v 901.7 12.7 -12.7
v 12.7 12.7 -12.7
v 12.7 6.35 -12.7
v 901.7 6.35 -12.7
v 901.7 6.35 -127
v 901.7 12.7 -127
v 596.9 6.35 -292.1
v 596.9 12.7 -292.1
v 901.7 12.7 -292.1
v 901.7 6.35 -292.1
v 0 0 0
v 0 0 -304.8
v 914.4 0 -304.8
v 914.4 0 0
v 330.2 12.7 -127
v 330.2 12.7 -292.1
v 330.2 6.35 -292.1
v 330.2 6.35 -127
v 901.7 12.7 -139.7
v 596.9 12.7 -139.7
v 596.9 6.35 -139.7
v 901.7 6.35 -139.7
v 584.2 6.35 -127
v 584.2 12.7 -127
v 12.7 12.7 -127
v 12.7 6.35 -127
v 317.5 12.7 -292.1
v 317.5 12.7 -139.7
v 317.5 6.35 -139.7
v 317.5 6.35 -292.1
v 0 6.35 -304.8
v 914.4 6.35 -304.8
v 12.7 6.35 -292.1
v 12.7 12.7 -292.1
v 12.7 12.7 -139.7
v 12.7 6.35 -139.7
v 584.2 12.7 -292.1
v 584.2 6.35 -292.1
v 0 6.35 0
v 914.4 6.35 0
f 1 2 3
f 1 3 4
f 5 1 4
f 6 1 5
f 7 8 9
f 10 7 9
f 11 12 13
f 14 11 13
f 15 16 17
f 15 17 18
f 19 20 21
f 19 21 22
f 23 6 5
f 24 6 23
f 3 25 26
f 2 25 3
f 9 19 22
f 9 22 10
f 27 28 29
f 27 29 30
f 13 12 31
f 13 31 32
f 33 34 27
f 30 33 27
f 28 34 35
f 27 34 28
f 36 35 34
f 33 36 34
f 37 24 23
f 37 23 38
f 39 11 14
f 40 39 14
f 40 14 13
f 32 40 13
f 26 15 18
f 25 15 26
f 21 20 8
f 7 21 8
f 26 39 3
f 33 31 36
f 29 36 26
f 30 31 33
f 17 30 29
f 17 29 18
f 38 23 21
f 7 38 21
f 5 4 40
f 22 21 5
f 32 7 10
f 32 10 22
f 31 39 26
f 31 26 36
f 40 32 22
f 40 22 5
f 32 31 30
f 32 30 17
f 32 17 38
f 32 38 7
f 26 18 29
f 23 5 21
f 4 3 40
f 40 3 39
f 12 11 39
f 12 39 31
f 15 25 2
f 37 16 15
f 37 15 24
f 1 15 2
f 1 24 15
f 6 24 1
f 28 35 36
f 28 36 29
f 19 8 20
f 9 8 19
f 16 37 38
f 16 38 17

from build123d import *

# Parameters (mm, degrees)
SKETCH1_W           = 914.4
SKETCH1_H           = 304.8
BOSS_EXTRUDE1_DEPTH = 12.7
SKETCH2_W           = 914.4
SKETCH2_H           = 304.8
SKETCH2_W_2         = 304.8
SKETCH2_H_2         = 152.4
CUT_EXTRUDE1_DEPTH  = 6.35


with BuildPart() as part:
    # Sketch1 → Boss-Extrude1 (new body)
    with BuildSketch(Plane(origin=(0, 0, 0), x_dir=(1, 0, 0), z_dir=(0, 1, 0))):
        with Locations((457.2, 152.4)):
            Rectangle(SKETCH1_W, SKETCH1_H)
    extrude(amount=BOSS_EXTRUDE1_DEPTH)

    # Sketch2 → Cut-Extrude1 (cut)
    with BuildSketch(Plane(origin=(0, 12.7, 0), x_dir=(1, 0, 0), z_dir=(0, 1, 0))):
        with Locations((457.2, 152.4)):
            Rectangle(SKETCH2_W, SKETCH2_H)
        Polygon((330.2, 127), (12.7, 127), (12.7, 12.7), (901.7, 12.7), (901.7, 127), (584.2, 127), (584.2, 292.1), (330.2, 292.1), align=None, mode=Mode.SUBTRACT)
        with Locations((165.1, 215.9)):
            Rectangle(SKETCH2_W_2, SKETCH2_H_2, mode=Mode.SUBTRACT)
        with Locations((749.3, 215.9)):
            Rectangle(SKETCH2_W_2, SKETCH2_H_2, mode=Mode.SUBTRACT)
    extrude(amount=-CUT_EXTRUDE1_DEPTH, mode=Mode.SUBTRACT)


solid = part.part
